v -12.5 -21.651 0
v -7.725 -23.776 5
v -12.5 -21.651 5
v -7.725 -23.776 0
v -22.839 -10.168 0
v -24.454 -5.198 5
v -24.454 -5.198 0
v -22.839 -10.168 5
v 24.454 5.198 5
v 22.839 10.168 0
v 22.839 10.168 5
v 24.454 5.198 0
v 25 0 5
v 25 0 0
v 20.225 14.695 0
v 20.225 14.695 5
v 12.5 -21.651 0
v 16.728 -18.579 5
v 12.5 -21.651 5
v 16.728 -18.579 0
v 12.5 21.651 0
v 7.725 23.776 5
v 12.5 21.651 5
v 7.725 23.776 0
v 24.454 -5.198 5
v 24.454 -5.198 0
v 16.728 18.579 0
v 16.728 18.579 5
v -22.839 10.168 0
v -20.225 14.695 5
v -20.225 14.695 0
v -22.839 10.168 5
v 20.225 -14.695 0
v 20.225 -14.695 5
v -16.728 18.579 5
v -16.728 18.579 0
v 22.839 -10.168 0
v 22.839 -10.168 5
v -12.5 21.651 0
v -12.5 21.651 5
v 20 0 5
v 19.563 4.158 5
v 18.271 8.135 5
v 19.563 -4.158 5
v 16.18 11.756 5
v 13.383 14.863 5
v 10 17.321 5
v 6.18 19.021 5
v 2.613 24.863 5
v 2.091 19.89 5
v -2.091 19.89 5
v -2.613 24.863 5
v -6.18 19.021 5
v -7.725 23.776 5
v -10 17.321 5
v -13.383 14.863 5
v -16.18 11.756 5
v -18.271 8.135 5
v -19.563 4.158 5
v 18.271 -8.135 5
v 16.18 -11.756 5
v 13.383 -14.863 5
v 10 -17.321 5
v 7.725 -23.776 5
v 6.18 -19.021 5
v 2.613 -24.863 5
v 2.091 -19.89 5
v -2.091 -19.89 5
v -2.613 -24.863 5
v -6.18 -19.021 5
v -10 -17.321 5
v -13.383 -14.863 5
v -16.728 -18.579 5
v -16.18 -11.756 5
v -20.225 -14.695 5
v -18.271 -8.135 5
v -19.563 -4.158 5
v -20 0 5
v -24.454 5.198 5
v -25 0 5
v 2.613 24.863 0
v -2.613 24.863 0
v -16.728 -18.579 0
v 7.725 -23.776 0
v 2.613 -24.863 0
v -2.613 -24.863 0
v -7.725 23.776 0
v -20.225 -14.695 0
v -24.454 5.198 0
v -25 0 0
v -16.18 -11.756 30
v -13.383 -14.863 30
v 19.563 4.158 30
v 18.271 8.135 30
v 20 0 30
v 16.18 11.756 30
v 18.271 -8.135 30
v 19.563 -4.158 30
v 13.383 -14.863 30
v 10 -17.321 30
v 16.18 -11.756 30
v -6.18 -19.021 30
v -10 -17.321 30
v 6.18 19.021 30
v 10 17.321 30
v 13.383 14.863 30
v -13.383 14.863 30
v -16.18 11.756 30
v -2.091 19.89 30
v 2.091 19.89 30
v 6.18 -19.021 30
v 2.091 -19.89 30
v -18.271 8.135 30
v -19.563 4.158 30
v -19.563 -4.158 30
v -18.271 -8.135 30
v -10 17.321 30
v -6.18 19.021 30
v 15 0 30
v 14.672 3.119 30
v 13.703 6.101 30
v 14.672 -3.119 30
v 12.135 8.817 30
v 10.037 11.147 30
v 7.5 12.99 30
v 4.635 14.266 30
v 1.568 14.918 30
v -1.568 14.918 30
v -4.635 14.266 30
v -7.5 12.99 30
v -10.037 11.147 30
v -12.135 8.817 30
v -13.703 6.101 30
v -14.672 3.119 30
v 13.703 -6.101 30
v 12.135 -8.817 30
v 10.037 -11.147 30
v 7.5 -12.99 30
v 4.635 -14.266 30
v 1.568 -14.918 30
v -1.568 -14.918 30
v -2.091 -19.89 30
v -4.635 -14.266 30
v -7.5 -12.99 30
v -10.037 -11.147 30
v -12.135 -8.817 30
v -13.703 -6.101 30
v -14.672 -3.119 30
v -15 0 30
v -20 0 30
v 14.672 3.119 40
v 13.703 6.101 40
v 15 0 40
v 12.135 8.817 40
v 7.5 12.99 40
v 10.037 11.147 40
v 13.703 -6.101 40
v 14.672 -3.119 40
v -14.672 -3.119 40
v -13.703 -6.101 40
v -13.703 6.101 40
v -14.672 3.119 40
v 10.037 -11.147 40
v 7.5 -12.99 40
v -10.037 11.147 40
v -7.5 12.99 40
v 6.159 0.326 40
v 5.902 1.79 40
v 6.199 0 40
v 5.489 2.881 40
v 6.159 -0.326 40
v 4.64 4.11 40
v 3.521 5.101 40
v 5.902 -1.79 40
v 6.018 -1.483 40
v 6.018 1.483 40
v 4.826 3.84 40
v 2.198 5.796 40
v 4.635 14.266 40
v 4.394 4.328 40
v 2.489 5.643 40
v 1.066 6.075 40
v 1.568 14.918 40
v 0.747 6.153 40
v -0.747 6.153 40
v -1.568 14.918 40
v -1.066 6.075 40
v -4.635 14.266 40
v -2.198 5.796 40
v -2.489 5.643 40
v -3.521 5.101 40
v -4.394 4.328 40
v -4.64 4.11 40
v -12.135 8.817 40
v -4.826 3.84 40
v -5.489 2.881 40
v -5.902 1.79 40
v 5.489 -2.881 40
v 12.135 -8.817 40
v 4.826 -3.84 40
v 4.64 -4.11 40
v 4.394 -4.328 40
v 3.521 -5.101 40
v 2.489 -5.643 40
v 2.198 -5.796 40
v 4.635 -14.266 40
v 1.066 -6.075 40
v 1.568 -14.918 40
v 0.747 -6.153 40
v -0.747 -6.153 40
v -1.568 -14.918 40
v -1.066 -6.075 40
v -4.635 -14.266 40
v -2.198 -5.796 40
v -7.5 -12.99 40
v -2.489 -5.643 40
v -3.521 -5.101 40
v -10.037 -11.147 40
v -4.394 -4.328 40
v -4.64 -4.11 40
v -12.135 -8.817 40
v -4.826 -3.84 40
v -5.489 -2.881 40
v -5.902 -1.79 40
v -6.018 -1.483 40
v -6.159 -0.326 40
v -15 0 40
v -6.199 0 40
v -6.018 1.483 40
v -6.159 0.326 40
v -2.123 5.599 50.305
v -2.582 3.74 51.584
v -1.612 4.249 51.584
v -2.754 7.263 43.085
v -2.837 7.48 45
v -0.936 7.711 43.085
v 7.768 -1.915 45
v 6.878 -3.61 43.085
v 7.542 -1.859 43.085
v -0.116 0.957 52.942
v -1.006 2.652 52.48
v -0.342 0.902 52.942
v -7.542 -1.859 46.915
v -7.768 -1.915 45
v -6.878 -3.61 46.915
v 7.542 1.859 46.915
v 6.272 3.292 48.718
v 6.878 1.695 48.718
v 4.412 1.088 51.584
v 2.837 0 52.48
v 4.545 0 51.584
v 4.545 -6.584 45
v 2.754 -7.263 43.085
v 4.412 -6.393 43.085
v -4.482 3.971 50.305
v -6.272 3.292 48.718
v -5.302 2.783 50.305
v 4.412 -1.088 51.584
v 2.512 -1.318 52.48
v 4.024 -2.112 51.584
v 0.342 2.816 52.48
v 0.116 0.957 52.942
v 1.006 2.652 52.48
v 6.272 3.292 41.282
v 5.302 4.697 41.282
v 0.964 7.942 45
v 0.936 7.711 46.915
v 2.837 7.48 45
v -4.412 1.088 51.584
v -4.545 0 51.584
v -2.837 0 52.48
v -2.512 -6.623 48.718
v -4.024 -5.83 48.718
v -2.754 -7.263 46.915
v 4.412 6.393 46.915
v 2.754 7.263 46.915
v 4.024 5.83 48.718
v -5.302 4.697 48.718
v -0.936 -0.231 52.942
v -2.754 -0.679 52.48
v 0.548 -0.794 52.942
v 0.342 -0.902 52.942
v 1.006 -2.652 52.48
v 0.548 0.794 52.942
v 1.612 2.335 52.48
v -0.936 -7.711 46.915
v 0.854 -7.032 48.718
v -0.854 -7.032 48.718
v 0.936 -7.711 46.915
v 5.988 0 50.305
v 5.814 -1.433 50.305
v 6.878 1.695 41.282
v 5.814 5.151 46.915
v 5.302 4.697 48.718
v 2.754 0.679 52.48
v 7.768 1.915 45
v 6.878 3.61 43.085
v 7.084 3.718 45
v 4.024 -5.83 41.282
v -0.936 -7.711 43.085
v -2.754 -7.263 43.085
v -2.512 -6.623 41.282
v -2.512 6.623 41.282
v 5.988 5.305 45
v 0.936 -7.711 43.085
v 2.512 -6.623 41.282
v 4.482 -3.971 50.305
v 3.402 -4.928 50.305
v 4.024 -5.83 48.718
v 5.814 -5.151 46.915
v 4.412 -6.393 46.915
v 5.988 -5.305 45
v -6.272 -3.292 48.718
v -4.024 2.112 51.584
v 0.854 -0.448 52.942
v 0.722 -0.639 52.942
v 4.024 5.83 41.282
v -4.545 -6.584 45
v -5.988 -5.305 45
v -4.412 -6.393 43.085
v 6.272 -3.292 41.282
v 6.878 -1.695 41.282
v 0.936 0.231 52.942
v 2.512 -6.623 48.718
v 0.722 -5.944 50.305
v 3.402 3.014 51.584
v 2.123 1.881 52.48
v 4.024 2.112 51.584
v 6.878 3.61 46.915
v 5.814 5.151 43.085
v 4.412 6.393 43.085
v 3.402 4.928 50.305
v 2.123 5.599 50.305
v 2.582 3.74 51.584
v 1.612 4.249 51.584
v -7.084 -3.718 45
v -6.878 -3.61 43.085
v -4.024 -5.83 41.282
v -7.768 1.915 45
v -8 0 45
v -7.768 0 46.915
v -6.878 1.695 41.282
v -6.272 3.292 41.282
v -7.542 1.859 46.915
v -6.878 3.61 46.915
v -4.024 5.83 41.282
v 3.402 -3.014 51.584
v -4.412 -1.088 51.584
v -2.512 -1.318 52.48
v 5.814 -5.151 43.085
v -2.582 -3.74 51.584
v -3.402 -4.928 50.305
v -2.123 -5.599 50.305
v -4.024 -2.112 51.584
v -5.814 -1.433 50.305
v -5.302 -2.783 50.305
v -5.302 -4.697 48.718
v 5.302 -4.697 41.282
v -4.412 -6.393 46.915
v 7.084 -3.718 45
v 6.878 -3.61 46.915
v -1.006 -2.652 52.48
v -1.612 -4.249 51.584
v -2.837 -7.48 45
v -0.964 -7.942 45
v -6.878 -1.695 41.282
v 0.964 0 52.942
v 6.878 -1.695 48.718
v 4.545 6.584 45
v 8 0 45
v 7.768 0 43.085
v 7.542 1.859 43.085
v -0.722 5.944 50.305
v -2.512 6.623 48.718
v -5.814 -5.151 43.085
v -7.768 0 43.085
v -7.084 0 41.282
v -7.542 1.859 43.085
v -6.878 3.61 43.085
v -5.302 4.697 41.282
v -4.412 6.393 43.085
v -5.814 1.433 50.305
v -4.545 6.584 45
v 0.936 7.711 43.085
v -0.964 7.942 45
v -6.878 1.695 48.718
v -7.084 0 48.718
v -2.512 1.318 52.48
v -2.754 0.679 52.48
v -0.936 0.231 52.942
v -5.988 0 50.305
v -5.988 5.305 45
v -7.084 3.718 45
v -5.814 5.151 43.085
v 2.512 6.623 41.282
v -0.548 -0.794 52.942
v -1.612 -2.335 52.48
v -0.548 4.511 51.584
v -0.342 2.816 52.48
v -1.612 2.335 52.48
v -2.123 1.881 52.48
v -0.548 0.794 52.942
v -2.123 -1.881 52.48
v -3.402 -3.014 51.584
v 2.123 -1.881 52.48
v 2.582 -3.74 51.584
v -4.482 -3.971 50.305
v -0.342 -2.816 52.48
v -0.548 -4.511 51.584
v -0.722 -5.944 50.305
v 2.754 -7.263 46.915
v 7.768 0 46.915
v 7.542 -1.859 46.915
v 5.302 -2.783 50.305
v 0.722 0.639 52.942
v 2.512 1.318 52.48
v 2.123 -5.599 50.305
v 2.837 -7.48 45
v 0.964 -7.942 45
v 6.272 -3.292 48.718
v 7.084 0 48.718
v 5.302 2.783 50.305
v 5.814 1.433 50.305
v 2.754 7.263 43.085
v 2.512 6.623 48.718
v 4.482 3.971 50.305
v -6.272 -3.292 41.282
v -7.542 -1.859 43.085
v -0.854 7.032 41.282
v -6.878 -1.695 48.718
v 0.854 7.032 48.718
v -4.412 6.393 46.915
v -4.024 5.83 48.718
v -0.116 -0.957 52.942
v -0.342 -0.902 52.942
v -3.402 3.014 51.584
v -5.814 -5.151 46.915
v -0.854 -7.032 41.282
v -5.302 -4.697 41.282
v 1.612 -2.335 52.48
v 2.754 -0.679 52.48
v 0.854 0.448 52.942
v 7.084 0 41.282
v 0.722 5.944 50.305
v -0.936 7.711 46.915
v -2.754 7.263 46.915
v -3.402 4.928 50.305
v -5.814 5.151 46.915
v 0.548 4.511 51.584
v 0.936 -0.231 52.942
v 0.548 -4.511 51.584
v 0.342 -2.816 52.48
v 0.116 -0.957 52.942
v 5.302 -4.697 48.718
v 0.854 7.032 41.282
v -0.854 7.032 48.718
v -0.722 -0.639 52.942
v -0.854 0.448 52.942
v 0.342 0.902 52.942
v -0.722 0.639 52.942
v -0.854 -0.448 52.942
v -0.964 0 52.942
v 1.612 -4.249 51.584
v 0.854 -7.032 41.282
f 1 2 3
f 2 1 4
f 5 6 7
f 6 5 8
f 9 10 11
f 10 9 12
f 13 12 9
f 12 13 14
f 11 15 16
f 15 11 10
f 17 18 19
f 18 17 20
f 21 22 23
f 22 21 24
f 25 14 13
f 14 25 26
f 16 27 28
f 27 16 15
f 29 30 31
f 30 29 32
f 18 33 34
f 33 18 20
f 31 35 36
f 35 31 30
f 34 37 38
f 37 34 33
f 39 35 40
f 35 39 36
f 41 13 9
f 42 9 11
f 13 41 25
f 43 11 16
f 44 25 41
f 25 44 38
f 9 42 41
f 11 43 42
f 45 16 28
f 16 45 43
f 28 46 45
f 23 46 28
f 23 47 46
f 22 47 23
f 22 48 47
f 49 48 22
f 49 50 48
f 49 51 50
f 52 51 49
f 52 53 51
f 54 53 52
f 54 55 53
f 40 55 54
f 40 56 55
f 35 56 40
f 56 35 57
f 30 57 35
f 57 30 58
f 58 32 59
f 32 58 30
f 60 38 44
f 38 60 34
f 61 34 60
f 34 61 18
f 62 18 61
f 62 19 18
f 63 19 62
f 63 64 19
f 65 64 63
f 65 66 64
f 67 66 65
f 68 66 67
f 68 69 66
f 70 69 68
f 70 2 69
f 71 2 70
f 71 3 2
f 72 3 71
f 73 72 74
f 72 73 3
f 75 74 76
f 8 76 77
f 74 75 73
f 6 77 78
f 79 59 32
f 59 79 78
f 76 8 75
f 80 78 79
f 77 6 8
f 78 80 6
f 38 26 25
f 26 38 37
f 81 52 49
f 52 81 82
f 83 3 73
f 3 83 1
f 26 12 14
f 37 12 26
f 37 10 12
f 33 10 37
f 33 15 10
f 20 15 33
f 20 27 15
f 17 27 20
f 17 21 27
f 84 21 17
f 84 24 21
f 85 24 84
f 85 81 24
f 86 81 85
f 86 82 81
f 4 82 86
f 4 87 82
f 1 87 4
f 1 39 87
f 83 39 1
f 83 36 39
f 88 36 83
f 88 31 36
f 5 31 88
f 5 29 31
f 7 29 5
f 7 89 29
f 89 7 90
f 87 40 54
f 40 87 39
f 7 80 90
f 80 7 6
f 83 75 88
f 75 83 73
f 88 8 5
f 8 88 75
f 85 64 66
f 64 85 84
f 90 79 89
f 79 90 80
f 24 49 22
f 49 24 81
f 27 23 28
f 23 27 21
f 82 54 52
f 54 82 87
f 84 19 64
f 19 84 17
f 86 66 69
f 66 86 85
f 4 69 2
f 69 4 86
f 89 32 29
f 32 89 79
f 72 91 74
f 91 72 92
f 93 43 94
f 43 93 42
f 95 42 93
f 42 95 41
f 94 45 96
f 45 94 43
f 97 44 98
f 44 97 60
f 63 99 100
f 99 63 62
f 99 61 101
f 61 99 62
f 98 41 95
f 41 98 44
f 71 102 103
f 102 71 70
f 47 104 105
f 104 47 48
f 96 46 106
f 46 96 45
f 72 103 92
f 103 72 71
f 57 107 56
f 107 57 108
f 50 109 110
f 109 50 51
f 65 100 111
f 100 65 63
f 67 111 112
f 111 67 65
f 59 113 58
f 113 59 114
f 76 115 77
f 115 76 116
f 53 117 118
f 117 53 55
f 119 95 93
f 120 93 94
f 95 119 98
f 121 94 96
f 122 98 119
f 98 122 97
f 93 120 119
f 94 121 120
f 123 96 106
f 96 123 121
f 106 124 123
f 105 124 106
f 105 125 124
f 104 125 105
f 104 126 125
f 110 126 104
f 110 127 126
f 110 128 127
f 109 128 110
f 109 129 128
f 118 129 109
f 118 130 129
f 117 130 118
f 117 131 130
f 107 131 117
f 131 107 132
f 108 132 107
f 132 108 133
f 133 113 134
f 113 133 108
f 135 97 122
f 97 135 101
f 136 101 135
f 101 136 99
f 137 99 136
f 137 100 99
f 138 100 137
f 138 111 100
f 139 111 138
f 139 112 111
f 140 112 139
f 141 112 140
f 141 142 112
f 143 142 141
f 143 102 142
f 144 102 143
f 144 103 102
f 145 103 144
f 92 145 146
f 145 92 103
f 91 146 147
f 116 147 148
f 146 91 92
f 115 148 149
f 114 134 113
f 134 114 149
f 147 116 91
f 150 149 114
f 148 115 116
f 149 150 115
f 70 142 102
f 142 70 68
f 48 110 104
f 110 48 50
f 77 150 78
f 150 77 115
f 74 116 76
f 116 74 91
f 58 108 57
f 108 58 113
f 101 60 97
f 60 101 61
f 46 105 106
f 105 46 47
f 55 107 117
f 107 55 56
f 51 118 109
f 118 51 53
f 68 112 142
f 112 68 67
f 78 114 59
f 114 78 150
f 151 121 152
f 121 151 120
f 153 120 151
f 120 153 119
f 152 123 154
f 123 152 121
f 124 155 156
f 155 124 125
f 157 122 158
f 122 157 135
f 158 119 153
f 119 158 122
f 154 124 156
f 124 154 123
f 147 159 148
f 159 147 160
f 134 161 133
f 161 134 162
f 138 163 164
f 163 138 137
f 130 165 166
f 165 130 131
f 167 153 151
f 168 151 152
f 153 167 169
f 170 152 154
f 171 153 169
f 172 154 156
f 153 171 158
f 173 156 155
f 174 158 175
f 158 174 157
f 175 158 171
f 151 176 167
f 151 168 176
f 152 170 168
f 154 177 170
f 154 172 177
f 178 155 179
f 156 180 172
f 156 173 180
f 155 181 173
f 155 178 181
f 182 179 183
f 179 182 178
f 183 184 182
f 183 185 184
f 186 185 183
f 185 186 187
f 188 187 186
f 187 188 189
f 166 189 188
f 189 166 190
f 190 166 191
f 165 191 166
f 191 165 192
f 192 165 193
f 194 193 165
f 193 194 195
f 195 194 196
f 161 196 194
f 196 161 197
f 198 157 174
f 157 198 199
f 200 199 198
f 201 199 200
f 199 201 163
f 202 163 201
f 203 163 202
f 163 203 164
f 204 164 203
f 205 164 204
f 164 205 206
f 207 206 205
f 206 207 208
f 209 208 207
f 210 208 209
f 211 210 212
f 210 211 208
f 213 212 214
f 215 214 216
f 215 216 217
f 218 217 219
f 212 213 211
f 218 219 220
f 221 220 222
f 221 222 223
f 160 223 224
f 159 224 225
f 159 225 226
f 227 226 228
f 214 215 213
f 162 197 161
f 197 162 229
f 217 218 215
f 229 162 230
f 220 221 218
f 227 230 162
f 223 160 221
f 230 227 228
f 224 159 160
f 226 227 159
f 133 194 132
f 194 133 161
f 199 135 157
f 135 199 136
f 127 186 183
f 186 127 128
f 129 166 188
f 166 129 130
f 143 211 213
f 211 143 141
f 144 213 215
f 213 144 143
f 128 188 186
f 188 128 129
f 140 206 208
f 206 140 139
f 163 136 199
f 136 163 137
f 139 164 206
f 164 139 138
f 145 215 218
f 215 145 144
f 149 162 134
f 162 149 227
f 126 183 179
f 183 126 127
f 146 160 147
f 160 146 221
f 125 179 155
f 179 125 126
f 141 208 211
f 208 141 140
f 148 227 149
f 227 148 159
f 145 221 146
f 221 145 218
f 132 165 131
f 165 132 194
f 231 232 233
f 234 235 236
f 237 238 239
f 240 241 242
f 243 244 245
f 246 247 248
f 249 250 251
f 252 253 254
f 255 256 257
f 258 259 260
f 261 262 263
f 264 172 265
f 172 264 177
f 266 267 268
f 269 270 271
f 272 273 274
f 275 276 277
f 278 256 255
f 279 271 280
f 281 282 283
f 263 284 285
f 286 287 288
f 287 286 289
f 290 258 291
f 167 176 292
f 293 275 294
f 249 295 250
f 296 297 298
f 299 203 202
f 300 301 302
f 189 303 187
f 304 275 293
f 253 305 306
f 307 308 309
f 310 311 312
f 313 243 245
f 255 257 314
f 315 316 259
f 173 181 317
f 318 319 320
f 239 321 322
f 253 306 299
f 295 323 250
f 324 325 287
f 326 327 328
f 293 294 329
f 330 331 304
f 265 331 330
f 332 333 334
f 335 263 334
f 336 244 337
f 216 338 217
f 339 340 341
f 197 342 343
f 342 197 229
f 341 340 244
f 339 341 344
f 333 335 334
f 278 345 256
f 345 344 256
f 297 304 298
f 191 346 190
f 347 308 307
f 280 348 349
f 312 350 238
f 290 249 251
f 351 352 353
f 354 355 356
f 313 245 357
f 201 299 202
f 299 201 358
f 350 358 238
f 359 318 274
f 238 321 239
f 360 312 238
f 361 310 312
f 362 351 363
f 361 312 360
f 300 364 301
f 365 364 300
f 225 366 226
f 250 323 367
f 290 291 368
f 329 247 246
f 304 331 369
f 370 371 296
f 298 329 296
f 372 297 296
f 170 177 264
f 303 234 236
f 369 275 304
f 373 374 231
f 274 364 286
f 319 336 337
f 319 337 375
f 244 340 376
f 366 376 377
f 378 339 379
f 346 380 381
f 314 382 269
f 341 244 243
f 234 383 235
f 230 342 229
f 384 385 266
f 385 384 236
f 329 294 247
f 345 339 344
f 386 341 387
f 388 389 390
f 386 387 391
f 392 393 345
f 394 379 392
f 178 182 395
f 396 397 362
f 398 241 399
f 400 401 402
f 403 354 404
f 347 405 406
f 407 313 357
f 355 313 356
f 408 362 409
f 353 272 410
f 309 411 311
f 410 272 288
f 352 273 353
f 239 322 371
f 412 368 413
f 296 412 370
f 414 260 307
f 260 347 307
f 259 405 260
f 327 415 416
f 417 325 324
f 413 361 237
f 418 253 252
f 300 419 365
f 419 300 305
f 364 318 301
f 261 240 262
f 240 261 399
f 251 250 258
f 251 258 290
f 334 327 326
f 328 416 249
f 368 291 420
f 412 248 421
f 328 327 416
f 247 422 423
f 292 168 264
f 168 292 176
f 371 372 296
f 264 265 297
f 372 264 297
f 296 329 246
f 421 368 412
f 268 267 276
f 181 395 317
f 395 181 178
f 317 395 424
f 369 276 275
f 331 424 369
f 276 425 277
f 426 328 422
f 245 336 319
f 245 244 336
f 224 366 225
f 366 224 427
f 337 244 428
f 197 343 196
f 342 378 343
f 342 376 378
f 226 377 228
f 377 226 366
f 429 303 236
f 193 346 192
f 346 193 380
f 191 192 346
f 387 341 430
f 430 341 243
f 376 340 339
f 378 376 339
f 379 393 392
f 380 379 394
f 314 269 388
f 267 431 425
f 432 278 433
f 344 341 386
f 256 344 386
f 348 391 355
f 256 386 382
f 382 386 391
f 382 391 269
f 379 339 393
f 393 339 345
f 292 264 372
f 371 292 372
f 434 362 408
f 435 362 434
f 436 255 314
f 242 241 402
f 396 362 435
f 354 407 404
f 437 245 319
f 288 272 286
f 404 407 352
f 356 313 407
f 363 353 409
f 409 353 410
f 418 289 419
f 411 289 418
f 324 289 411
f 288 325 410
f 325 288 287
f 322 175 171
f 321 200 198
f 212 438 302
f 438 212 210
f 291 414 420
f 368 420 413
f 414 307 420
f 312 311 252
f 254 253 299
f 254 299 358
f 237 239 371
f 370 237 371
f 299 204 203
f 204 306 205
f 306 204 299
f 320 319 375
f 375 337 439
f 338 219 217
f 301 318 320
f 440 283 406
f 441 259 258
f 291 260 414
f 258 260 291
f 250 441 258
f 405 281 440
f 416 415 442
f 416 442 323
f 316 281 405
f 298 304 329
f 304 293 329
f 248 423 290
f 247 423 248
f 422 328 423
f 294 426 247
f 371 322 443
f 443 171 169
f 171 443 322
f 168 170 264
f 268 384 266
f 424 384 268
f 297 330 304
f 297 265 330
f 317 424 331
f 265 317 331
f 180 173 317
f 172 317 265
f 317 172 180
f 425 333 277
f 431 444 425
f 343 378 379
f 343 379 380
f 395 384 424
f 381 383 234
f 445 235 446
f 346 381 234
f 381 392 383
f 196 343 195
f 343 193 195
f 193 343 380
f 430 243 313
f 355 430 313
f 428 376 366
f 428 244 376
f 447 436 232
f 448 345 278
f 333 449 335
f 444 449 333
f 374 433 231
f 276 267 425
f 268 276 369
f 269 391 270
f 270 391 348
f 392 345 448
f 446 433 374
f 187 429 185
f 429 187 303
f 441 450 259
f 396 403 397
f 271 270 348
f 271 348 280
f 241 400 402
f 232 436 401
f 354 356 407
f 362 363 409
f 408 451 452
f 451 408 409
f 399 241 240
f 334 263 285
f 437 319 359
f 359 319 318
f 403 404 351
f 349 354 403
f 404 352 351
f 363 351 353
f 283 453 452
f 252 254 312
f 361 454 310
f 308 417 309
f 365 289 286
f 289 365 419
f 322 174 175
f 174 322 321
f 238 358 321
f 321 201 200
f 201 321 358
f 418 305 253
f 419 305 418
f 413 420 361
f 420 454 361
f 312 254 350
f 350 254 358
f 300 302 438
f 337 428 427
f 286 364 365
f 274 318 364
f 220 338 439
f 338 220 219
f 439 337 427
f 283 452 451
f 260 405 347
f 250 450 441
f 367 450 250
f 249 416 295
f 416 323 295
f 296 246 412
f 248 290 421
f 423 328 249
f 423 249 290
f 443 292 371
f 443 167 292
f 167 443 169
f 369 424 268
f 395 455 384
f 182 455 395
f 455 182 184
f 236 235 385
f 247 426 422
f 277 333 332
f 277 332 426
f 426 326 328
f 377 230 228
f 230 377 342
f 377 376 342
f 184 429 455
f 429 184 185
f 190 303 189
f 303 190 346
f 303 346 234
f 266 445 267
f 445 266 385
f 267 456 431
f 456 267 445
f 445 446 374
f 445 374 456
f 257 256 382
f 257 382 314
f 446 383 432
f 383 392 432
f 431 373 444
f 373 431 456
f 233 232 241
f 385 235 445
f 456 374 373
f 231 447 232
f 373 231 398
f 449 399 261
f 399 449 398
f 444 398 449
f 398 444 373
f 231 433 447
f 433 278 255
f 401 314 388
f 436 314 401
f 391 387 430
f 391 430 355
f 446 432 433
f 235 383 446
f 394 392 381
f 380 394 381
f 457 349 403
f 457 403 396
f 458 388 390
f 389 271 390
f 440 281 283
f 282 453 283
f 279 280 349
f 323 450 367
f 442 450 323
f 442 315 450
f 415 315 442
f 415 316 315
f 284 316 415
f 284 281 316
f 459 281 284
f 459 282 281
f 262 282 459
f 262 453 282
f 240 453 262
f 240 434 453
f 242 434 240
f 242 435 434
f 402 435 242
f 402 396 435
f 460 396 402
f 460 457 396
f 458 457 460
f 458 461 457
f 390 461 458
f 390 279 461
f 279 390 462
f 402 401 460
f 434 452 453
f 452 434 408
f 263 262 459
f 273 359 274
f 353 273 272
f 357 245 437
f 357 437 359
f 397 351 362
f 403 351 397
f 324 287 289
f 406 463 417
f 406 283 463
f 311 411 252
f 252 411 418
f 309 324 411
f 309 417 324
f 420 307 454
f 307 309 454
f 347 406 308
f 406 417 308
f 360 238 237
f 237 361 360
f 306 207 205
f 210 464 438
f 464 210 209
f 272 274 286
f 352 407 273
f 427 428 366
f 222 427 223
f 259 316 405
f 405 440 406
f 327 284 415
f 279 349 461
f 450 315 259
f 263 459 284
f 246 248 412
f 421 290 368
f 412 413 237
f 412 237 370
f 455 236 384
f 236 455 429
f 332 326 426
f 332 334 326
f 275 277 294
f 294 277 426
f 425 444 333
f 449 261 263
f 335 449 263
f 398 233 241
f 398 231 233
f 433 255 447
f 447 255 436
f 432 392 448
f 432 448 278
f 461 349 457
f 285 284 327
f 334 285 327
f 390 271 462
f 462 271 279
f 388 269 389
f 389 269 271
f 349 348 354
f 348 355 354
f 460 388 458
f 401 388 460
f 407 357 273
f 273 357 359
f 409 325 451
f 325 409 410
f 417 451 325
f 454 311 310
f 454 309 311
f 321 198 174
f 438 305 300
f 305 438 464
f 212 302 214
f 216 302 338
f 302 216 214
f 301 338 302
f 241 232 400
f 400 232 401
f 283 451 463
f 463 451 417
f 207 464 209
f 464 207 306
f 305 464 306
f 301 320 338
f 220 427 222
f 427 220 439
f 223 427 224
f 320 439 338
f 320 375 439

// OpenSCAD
// Figura realizada: Peón, pieza de ajedrez
translate([0, 0, 0])  
cylinder(h=5, r=25); // Base del peón

translate([0, 0, 5])
cylinder(h=25, r=20); // Cuerpo del peón

translate([0, 0, 30])
cylinder(h=10, r=15); // Parte superior del peón

translate([0, 0, 45])
sphere(r=8); // Cabeza del peón

translate([0, 0, 43]) // Abertura en la parte superior
difference() {
    rotate([0, 0, 90]) cube([2, 10, 6], center=true);
}

// Grabar el nombre en la parte superior de la base
translate([0, 0, 2])
linear_extrude(height=0.5)
text("MarcForés", size=2, halign="center", valign="center"); // Tamaño reducido
